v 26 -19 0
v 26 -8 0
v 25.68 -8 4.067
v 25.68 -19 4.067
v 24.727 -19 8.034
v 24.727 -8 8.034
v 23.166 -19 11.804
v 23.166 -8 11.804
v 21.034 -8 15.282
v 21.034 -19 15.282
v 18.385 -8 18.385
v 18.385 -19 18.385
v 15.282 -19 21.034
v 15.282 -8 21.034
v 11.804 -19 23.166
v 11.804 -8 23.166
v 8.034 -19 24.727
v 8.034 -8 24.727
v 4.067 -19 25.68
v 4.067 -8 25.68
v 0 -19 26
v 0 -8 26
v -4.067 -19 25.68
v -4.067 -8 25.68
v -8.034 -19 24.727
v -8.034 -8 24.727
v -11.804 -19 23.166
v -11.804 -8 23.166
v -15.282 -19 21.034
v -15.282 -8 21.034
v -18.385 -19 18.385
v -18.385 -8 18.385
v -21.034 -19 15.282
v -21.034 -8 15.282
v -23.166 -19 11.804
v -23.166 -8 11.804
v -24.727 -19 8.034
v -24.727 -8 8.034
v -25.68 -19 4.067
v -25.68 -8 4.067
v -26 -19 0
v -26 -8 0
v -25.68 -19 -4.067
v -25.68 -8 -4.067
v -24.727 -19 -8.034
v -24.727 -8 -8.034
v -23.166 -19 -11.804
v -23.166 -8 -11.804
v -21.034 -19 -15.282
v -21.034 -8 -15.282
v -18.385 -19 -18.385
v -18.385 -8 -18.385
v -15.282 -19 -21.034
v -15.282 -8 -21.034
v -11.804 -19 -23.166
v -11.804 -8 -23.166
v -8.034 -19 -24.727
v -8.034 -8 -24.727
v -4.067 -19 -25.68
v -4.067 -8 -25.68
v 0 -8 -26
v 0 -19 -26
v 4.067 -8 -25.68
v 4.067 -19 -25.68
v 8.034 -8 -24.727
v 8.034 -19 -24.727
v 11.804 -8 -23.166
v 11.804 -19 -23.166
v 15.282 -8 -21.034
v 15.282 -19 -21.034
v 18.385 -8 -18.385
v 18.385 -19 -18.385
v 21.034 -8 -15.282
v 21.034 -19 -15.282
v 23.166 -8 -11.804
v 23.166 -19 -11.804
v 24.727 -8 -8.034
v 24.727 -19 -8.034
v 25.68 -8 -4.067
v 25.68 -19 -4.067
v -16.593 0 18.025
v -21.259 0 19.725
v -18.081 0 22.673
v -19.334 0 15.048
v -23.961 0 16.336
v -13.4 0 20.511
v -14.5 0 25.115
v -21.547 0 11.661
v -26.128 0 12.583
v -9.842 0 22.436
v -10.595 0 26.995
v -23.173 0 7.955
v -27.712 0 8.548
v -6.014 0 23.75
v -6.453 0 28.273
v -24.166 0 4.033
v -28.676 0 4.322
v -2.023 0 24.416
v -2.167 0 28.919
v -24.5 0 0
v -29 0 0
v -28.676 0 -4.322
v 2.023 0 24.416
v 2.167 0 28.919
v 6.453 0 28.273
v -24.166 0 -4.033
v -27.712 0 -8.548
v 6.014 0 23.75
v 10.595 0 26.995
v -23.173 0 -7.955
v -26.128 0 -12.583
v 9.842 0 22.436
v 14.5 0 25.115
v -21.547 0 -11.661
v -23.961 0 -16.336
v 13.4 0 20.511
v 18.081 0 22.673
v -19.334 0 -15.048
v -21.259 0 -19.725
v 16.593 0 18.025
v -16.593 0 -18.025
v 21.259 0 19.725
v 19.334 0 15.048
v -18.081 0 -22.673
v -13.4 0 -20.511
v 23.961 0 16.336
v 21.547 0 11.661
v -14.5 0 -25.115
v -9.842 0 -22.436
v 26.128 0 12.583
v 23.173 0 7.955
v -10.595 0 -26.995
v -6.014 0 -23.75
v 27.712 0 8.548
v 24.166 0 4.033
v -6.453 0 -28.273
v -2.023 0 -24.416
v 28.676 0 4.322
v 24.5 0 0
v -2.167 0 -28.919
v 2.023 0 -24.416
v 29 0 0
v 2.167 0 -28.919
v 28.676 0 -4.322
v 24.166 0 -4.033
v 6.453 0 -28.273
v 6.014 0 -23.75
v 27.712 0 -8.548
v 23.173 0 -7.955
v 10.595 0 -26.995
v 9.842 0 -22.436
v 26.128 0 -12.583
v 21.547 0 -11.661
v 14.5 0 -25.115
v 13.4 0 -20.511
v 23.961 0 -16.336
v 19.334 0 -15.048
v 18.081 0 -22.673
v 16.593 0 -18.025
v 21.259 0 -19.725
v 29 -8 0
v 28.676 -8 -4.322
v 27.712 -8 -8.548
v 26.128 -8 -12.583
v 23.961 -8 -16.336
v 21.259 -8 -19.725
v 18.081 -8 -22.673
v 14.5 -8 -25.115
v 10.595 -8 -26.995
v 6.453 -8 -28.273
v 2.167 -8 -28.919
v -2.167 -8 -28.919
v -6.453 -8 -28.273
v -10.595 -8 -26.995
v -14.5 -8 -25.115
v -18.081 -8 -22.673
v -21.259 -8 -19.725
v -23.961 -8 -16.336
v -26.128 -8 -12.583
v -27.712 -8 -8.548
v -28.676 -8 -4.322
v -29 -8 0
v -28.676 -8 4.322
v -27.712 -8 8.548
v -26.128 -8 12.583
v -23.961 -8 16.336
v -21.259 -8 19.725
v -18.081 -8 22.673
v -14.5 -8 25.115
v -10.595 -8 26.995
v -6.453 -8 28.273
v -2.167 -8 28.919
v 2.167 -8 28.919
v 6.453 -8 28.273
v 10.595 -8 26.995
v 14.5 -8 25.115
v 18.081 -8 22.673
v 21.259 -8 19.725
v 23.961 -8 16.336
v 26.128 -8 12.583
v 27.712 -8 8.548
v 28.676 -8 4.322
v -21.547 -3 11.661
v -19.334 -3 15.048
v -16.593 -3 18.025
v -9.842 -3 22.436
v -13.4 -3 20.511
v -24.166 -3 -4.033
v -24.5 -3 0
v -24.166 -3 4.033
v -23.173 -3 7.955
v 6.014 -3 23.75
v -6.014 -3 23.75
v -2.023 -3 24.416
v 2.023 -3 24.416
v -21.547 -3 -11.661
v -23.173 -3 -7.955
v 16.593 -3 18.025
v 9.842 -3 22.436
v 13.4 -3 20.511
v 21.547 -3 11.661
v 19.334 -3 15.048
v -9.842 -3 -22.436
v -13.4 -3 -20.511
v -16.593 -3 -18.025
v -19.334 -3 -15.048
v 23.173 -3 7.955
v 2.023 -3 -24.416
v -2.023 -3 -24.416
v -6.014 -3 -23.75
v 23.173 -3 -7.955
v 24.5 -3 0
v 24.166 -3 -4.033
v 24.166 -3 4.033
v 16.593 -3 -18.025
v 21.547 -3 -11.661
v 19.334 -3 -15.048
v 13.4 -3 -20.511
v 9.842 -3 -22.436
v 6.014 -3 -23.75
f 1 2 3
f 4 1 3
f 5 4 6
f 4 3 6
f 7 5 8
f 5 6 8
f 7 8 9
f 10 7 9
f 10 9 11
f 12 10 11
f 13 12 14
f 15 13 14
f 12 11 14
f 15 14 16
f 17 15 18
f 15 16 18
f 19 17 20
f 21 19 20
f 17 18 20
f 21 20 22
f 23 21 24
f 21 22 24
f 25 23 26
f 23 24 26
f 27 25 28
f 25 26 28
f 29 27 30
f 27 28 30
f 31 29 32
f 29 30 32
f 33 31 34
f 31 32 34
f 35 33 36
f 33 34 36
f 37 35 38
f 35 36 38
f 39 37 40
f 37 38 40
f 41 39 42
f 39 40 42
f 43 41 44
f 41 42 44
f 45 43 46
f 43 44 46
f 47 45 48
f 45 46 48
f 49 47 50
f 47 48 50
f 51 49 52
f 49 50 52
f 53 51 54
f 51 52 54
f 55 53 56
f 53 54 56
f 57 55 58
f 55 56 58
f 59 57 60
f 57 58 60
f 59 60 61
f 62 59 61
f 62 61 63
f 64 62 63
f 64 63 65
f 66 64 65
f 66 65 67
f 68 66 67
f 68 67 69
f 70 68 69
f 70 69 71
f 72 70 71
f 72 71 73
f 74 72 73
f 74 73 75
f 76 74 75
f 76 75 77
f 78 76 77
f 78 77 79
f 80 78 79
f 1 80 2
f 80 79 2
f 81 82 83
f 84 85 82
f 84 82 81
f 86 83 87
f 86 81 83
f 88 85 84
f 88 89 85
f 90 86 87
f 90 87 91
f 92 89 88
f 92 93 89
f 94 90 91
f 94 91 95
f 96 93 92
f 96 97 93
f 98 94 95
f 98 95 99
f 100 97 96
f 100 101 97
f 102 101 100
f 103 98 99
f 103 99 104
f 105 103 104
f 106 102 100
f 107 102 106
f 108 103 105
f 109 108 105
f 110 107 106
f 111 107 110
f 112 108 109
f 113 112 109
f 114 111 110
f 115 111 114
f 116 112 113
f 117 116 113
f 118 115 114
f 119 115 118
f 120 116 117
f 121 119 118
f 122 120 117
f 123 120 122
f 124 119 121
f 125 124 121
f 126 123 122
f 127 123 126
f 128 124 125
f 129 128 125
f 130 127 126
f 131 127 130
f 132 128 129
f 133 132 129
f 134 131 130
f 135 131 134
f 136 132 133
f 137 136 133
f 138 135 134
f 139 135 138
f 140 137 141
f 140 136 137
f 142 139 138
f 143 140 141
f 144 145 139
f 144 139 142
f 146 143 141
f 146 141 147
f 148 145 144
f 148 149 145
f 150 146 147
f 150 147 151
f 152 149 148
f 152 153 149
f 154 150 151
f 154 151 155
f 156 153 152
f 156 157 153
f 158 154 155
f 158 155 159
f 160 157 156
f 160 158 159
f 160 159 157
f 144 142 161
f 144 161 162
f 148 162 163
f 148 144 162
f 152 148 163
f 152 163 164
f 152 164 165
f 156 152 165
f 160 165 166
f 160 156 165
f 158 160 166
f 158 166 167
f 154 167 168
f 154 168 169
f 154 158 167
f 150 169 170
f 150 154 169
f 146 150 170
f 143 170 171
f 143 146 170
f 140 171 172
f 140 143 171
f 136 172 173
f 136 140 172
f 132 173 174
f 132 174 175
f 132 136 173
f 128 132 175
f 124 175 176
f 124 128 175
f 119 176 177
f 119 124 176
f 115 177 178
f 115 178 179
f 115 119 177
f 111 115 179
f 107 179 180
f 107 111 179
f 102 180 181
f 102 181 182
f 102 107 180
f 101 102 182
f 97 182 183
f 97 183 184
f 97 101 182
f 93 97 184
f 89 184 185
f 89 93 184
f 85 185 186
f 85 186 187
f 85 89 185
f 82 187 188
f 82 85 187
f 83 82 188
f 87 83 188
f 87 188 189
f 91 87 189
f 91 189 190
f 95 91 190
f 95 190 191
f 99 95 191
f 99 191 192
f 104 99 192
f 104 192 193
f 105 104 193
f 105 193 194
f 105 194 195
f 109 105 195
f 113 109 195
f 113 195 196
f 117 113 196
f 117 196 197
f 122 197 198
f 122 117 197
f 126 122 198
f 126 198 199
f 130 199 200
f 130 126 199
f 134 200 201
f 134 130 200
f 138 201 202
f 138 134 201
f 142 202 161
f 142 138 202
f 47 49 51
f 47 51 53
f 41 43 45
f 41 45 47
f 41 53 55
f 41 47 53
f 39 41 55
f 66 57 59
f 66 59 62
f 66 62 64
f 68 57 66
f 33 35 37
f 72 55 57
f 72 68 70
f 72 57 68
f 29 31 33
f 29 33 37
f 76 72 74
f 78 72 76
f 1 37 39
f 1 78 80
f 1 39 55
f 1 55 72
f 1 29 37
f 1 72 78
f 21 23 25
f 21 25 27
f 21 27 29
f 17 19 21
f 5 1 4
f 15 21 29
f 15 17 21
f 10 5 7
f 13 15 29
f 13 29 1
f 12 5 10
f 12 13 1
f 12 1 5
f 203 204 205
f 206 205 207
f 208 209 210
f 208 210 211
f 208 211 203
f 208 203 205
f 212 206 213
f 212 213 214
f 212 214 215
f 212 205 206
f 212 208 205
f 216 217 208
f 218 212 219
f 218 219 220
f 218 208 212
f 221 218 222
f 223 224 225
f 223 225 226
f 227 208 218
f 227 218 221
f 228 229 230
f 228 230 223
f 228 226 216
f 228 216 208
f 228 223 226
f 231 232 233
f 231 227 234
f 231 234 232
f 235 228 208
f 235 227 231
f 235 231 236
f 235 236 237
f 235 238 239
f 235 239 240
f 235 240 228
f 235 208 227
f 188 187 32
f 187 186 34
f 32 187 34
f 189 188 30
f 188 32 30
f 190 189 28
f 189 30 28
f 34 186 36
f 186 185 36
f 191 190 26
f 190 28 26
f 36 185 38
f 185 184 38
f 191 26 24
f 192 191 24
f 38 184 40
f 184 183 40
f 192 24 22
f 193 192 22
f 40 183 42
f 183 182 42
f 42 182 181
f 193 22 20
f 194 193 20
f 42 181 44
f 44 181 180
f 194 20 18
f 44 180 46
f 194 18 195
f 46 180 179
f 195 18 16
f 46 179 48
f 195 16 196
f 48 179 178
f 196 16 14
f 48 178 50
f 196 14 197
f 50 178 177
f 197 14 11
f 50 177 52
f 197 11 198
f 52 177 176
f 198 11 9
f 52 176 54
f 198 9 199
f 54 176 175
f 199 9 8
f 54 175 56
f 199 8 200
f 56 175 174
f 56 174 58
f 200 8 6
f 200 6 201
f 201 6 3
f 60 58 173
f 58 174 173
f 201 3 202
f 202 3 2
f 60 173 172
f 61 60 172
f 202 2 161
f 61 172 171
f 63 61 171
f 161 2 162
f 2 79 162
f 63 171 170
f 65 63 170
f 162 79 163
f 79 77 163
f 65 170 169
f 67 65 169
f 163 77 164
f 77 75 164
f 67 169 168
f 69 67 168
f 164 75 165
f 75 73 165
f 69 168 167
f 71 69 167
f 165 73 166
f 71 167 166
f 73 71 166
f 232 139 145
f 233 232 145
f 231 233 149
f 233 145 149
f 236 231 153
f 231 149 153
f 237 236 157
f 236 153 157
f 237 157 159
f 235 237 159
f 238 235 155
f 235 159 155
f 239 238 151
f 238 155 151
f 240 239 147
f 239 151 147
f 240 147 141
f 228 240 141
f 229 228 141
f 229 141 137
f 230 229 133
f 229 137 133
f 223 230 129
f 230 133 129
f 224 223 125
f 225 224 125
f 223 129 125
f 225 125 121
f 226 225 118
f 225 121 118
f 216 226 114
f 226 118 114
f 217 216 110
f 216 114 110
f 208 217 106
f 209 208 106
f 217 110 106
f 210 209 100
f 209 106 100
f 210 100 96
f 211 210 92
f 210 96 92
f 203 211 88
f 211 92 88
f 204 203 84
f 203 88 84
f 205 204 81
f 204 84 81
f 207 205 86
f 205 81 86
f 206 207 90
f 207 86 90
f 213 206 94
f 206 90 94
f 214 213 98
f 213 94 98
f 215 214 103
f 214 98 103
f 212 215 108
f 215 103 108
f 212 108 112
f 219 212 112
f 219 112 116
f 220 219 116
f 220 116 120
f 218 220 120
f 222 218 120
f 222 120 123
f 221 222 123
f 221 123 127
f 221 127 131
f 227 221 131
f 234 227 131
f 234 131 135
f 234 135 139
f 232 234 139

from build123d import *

# Parameters (mm, degrees)
SKETCH1_R           = 29
BOSS_EXTRUDE1_DEPTH = 8
SKETCH2_R           = 26
BOSS_EXTRUDE2_DEPTH = 11
SKETCH3_R           = 24.5
CUT_EXTRUDE1_DEPTH  = 3


with BuildPart() as part:
    # Sketch1 → Boss-Extrude1 (new body)
    with BuildSketch(Plane(origin=(0, 0, 0), x_dir=(1, 0, 0), z_dir=(0, 1, 0))):
        Circle(SKETCH1_R)
    extrude(amount=-BOSS_EXTRUDE1_DEPTH)

    # Sketch2 → Boss-Extrude2 (add)
    with BuildSketch(Plane.XZ.offset(8)):
        Circle(SKETCH2_R)
    extrude(amount=BOSS_EXTRUDE2_DEPTH)

    # Sketch3 → Cut-Extrude1 (cut)
    with BuildSketch(Plane(origin=(0, 0, 0), x_dir=(1, 0, 0), z_dir=(0, 1, 0))):
        Circle(SKETCH3_R)
    extrude(amount=-CUT_EXTRUDE1_DEPTH, mode=Mode.SUBTRACT)


solid = part.part
